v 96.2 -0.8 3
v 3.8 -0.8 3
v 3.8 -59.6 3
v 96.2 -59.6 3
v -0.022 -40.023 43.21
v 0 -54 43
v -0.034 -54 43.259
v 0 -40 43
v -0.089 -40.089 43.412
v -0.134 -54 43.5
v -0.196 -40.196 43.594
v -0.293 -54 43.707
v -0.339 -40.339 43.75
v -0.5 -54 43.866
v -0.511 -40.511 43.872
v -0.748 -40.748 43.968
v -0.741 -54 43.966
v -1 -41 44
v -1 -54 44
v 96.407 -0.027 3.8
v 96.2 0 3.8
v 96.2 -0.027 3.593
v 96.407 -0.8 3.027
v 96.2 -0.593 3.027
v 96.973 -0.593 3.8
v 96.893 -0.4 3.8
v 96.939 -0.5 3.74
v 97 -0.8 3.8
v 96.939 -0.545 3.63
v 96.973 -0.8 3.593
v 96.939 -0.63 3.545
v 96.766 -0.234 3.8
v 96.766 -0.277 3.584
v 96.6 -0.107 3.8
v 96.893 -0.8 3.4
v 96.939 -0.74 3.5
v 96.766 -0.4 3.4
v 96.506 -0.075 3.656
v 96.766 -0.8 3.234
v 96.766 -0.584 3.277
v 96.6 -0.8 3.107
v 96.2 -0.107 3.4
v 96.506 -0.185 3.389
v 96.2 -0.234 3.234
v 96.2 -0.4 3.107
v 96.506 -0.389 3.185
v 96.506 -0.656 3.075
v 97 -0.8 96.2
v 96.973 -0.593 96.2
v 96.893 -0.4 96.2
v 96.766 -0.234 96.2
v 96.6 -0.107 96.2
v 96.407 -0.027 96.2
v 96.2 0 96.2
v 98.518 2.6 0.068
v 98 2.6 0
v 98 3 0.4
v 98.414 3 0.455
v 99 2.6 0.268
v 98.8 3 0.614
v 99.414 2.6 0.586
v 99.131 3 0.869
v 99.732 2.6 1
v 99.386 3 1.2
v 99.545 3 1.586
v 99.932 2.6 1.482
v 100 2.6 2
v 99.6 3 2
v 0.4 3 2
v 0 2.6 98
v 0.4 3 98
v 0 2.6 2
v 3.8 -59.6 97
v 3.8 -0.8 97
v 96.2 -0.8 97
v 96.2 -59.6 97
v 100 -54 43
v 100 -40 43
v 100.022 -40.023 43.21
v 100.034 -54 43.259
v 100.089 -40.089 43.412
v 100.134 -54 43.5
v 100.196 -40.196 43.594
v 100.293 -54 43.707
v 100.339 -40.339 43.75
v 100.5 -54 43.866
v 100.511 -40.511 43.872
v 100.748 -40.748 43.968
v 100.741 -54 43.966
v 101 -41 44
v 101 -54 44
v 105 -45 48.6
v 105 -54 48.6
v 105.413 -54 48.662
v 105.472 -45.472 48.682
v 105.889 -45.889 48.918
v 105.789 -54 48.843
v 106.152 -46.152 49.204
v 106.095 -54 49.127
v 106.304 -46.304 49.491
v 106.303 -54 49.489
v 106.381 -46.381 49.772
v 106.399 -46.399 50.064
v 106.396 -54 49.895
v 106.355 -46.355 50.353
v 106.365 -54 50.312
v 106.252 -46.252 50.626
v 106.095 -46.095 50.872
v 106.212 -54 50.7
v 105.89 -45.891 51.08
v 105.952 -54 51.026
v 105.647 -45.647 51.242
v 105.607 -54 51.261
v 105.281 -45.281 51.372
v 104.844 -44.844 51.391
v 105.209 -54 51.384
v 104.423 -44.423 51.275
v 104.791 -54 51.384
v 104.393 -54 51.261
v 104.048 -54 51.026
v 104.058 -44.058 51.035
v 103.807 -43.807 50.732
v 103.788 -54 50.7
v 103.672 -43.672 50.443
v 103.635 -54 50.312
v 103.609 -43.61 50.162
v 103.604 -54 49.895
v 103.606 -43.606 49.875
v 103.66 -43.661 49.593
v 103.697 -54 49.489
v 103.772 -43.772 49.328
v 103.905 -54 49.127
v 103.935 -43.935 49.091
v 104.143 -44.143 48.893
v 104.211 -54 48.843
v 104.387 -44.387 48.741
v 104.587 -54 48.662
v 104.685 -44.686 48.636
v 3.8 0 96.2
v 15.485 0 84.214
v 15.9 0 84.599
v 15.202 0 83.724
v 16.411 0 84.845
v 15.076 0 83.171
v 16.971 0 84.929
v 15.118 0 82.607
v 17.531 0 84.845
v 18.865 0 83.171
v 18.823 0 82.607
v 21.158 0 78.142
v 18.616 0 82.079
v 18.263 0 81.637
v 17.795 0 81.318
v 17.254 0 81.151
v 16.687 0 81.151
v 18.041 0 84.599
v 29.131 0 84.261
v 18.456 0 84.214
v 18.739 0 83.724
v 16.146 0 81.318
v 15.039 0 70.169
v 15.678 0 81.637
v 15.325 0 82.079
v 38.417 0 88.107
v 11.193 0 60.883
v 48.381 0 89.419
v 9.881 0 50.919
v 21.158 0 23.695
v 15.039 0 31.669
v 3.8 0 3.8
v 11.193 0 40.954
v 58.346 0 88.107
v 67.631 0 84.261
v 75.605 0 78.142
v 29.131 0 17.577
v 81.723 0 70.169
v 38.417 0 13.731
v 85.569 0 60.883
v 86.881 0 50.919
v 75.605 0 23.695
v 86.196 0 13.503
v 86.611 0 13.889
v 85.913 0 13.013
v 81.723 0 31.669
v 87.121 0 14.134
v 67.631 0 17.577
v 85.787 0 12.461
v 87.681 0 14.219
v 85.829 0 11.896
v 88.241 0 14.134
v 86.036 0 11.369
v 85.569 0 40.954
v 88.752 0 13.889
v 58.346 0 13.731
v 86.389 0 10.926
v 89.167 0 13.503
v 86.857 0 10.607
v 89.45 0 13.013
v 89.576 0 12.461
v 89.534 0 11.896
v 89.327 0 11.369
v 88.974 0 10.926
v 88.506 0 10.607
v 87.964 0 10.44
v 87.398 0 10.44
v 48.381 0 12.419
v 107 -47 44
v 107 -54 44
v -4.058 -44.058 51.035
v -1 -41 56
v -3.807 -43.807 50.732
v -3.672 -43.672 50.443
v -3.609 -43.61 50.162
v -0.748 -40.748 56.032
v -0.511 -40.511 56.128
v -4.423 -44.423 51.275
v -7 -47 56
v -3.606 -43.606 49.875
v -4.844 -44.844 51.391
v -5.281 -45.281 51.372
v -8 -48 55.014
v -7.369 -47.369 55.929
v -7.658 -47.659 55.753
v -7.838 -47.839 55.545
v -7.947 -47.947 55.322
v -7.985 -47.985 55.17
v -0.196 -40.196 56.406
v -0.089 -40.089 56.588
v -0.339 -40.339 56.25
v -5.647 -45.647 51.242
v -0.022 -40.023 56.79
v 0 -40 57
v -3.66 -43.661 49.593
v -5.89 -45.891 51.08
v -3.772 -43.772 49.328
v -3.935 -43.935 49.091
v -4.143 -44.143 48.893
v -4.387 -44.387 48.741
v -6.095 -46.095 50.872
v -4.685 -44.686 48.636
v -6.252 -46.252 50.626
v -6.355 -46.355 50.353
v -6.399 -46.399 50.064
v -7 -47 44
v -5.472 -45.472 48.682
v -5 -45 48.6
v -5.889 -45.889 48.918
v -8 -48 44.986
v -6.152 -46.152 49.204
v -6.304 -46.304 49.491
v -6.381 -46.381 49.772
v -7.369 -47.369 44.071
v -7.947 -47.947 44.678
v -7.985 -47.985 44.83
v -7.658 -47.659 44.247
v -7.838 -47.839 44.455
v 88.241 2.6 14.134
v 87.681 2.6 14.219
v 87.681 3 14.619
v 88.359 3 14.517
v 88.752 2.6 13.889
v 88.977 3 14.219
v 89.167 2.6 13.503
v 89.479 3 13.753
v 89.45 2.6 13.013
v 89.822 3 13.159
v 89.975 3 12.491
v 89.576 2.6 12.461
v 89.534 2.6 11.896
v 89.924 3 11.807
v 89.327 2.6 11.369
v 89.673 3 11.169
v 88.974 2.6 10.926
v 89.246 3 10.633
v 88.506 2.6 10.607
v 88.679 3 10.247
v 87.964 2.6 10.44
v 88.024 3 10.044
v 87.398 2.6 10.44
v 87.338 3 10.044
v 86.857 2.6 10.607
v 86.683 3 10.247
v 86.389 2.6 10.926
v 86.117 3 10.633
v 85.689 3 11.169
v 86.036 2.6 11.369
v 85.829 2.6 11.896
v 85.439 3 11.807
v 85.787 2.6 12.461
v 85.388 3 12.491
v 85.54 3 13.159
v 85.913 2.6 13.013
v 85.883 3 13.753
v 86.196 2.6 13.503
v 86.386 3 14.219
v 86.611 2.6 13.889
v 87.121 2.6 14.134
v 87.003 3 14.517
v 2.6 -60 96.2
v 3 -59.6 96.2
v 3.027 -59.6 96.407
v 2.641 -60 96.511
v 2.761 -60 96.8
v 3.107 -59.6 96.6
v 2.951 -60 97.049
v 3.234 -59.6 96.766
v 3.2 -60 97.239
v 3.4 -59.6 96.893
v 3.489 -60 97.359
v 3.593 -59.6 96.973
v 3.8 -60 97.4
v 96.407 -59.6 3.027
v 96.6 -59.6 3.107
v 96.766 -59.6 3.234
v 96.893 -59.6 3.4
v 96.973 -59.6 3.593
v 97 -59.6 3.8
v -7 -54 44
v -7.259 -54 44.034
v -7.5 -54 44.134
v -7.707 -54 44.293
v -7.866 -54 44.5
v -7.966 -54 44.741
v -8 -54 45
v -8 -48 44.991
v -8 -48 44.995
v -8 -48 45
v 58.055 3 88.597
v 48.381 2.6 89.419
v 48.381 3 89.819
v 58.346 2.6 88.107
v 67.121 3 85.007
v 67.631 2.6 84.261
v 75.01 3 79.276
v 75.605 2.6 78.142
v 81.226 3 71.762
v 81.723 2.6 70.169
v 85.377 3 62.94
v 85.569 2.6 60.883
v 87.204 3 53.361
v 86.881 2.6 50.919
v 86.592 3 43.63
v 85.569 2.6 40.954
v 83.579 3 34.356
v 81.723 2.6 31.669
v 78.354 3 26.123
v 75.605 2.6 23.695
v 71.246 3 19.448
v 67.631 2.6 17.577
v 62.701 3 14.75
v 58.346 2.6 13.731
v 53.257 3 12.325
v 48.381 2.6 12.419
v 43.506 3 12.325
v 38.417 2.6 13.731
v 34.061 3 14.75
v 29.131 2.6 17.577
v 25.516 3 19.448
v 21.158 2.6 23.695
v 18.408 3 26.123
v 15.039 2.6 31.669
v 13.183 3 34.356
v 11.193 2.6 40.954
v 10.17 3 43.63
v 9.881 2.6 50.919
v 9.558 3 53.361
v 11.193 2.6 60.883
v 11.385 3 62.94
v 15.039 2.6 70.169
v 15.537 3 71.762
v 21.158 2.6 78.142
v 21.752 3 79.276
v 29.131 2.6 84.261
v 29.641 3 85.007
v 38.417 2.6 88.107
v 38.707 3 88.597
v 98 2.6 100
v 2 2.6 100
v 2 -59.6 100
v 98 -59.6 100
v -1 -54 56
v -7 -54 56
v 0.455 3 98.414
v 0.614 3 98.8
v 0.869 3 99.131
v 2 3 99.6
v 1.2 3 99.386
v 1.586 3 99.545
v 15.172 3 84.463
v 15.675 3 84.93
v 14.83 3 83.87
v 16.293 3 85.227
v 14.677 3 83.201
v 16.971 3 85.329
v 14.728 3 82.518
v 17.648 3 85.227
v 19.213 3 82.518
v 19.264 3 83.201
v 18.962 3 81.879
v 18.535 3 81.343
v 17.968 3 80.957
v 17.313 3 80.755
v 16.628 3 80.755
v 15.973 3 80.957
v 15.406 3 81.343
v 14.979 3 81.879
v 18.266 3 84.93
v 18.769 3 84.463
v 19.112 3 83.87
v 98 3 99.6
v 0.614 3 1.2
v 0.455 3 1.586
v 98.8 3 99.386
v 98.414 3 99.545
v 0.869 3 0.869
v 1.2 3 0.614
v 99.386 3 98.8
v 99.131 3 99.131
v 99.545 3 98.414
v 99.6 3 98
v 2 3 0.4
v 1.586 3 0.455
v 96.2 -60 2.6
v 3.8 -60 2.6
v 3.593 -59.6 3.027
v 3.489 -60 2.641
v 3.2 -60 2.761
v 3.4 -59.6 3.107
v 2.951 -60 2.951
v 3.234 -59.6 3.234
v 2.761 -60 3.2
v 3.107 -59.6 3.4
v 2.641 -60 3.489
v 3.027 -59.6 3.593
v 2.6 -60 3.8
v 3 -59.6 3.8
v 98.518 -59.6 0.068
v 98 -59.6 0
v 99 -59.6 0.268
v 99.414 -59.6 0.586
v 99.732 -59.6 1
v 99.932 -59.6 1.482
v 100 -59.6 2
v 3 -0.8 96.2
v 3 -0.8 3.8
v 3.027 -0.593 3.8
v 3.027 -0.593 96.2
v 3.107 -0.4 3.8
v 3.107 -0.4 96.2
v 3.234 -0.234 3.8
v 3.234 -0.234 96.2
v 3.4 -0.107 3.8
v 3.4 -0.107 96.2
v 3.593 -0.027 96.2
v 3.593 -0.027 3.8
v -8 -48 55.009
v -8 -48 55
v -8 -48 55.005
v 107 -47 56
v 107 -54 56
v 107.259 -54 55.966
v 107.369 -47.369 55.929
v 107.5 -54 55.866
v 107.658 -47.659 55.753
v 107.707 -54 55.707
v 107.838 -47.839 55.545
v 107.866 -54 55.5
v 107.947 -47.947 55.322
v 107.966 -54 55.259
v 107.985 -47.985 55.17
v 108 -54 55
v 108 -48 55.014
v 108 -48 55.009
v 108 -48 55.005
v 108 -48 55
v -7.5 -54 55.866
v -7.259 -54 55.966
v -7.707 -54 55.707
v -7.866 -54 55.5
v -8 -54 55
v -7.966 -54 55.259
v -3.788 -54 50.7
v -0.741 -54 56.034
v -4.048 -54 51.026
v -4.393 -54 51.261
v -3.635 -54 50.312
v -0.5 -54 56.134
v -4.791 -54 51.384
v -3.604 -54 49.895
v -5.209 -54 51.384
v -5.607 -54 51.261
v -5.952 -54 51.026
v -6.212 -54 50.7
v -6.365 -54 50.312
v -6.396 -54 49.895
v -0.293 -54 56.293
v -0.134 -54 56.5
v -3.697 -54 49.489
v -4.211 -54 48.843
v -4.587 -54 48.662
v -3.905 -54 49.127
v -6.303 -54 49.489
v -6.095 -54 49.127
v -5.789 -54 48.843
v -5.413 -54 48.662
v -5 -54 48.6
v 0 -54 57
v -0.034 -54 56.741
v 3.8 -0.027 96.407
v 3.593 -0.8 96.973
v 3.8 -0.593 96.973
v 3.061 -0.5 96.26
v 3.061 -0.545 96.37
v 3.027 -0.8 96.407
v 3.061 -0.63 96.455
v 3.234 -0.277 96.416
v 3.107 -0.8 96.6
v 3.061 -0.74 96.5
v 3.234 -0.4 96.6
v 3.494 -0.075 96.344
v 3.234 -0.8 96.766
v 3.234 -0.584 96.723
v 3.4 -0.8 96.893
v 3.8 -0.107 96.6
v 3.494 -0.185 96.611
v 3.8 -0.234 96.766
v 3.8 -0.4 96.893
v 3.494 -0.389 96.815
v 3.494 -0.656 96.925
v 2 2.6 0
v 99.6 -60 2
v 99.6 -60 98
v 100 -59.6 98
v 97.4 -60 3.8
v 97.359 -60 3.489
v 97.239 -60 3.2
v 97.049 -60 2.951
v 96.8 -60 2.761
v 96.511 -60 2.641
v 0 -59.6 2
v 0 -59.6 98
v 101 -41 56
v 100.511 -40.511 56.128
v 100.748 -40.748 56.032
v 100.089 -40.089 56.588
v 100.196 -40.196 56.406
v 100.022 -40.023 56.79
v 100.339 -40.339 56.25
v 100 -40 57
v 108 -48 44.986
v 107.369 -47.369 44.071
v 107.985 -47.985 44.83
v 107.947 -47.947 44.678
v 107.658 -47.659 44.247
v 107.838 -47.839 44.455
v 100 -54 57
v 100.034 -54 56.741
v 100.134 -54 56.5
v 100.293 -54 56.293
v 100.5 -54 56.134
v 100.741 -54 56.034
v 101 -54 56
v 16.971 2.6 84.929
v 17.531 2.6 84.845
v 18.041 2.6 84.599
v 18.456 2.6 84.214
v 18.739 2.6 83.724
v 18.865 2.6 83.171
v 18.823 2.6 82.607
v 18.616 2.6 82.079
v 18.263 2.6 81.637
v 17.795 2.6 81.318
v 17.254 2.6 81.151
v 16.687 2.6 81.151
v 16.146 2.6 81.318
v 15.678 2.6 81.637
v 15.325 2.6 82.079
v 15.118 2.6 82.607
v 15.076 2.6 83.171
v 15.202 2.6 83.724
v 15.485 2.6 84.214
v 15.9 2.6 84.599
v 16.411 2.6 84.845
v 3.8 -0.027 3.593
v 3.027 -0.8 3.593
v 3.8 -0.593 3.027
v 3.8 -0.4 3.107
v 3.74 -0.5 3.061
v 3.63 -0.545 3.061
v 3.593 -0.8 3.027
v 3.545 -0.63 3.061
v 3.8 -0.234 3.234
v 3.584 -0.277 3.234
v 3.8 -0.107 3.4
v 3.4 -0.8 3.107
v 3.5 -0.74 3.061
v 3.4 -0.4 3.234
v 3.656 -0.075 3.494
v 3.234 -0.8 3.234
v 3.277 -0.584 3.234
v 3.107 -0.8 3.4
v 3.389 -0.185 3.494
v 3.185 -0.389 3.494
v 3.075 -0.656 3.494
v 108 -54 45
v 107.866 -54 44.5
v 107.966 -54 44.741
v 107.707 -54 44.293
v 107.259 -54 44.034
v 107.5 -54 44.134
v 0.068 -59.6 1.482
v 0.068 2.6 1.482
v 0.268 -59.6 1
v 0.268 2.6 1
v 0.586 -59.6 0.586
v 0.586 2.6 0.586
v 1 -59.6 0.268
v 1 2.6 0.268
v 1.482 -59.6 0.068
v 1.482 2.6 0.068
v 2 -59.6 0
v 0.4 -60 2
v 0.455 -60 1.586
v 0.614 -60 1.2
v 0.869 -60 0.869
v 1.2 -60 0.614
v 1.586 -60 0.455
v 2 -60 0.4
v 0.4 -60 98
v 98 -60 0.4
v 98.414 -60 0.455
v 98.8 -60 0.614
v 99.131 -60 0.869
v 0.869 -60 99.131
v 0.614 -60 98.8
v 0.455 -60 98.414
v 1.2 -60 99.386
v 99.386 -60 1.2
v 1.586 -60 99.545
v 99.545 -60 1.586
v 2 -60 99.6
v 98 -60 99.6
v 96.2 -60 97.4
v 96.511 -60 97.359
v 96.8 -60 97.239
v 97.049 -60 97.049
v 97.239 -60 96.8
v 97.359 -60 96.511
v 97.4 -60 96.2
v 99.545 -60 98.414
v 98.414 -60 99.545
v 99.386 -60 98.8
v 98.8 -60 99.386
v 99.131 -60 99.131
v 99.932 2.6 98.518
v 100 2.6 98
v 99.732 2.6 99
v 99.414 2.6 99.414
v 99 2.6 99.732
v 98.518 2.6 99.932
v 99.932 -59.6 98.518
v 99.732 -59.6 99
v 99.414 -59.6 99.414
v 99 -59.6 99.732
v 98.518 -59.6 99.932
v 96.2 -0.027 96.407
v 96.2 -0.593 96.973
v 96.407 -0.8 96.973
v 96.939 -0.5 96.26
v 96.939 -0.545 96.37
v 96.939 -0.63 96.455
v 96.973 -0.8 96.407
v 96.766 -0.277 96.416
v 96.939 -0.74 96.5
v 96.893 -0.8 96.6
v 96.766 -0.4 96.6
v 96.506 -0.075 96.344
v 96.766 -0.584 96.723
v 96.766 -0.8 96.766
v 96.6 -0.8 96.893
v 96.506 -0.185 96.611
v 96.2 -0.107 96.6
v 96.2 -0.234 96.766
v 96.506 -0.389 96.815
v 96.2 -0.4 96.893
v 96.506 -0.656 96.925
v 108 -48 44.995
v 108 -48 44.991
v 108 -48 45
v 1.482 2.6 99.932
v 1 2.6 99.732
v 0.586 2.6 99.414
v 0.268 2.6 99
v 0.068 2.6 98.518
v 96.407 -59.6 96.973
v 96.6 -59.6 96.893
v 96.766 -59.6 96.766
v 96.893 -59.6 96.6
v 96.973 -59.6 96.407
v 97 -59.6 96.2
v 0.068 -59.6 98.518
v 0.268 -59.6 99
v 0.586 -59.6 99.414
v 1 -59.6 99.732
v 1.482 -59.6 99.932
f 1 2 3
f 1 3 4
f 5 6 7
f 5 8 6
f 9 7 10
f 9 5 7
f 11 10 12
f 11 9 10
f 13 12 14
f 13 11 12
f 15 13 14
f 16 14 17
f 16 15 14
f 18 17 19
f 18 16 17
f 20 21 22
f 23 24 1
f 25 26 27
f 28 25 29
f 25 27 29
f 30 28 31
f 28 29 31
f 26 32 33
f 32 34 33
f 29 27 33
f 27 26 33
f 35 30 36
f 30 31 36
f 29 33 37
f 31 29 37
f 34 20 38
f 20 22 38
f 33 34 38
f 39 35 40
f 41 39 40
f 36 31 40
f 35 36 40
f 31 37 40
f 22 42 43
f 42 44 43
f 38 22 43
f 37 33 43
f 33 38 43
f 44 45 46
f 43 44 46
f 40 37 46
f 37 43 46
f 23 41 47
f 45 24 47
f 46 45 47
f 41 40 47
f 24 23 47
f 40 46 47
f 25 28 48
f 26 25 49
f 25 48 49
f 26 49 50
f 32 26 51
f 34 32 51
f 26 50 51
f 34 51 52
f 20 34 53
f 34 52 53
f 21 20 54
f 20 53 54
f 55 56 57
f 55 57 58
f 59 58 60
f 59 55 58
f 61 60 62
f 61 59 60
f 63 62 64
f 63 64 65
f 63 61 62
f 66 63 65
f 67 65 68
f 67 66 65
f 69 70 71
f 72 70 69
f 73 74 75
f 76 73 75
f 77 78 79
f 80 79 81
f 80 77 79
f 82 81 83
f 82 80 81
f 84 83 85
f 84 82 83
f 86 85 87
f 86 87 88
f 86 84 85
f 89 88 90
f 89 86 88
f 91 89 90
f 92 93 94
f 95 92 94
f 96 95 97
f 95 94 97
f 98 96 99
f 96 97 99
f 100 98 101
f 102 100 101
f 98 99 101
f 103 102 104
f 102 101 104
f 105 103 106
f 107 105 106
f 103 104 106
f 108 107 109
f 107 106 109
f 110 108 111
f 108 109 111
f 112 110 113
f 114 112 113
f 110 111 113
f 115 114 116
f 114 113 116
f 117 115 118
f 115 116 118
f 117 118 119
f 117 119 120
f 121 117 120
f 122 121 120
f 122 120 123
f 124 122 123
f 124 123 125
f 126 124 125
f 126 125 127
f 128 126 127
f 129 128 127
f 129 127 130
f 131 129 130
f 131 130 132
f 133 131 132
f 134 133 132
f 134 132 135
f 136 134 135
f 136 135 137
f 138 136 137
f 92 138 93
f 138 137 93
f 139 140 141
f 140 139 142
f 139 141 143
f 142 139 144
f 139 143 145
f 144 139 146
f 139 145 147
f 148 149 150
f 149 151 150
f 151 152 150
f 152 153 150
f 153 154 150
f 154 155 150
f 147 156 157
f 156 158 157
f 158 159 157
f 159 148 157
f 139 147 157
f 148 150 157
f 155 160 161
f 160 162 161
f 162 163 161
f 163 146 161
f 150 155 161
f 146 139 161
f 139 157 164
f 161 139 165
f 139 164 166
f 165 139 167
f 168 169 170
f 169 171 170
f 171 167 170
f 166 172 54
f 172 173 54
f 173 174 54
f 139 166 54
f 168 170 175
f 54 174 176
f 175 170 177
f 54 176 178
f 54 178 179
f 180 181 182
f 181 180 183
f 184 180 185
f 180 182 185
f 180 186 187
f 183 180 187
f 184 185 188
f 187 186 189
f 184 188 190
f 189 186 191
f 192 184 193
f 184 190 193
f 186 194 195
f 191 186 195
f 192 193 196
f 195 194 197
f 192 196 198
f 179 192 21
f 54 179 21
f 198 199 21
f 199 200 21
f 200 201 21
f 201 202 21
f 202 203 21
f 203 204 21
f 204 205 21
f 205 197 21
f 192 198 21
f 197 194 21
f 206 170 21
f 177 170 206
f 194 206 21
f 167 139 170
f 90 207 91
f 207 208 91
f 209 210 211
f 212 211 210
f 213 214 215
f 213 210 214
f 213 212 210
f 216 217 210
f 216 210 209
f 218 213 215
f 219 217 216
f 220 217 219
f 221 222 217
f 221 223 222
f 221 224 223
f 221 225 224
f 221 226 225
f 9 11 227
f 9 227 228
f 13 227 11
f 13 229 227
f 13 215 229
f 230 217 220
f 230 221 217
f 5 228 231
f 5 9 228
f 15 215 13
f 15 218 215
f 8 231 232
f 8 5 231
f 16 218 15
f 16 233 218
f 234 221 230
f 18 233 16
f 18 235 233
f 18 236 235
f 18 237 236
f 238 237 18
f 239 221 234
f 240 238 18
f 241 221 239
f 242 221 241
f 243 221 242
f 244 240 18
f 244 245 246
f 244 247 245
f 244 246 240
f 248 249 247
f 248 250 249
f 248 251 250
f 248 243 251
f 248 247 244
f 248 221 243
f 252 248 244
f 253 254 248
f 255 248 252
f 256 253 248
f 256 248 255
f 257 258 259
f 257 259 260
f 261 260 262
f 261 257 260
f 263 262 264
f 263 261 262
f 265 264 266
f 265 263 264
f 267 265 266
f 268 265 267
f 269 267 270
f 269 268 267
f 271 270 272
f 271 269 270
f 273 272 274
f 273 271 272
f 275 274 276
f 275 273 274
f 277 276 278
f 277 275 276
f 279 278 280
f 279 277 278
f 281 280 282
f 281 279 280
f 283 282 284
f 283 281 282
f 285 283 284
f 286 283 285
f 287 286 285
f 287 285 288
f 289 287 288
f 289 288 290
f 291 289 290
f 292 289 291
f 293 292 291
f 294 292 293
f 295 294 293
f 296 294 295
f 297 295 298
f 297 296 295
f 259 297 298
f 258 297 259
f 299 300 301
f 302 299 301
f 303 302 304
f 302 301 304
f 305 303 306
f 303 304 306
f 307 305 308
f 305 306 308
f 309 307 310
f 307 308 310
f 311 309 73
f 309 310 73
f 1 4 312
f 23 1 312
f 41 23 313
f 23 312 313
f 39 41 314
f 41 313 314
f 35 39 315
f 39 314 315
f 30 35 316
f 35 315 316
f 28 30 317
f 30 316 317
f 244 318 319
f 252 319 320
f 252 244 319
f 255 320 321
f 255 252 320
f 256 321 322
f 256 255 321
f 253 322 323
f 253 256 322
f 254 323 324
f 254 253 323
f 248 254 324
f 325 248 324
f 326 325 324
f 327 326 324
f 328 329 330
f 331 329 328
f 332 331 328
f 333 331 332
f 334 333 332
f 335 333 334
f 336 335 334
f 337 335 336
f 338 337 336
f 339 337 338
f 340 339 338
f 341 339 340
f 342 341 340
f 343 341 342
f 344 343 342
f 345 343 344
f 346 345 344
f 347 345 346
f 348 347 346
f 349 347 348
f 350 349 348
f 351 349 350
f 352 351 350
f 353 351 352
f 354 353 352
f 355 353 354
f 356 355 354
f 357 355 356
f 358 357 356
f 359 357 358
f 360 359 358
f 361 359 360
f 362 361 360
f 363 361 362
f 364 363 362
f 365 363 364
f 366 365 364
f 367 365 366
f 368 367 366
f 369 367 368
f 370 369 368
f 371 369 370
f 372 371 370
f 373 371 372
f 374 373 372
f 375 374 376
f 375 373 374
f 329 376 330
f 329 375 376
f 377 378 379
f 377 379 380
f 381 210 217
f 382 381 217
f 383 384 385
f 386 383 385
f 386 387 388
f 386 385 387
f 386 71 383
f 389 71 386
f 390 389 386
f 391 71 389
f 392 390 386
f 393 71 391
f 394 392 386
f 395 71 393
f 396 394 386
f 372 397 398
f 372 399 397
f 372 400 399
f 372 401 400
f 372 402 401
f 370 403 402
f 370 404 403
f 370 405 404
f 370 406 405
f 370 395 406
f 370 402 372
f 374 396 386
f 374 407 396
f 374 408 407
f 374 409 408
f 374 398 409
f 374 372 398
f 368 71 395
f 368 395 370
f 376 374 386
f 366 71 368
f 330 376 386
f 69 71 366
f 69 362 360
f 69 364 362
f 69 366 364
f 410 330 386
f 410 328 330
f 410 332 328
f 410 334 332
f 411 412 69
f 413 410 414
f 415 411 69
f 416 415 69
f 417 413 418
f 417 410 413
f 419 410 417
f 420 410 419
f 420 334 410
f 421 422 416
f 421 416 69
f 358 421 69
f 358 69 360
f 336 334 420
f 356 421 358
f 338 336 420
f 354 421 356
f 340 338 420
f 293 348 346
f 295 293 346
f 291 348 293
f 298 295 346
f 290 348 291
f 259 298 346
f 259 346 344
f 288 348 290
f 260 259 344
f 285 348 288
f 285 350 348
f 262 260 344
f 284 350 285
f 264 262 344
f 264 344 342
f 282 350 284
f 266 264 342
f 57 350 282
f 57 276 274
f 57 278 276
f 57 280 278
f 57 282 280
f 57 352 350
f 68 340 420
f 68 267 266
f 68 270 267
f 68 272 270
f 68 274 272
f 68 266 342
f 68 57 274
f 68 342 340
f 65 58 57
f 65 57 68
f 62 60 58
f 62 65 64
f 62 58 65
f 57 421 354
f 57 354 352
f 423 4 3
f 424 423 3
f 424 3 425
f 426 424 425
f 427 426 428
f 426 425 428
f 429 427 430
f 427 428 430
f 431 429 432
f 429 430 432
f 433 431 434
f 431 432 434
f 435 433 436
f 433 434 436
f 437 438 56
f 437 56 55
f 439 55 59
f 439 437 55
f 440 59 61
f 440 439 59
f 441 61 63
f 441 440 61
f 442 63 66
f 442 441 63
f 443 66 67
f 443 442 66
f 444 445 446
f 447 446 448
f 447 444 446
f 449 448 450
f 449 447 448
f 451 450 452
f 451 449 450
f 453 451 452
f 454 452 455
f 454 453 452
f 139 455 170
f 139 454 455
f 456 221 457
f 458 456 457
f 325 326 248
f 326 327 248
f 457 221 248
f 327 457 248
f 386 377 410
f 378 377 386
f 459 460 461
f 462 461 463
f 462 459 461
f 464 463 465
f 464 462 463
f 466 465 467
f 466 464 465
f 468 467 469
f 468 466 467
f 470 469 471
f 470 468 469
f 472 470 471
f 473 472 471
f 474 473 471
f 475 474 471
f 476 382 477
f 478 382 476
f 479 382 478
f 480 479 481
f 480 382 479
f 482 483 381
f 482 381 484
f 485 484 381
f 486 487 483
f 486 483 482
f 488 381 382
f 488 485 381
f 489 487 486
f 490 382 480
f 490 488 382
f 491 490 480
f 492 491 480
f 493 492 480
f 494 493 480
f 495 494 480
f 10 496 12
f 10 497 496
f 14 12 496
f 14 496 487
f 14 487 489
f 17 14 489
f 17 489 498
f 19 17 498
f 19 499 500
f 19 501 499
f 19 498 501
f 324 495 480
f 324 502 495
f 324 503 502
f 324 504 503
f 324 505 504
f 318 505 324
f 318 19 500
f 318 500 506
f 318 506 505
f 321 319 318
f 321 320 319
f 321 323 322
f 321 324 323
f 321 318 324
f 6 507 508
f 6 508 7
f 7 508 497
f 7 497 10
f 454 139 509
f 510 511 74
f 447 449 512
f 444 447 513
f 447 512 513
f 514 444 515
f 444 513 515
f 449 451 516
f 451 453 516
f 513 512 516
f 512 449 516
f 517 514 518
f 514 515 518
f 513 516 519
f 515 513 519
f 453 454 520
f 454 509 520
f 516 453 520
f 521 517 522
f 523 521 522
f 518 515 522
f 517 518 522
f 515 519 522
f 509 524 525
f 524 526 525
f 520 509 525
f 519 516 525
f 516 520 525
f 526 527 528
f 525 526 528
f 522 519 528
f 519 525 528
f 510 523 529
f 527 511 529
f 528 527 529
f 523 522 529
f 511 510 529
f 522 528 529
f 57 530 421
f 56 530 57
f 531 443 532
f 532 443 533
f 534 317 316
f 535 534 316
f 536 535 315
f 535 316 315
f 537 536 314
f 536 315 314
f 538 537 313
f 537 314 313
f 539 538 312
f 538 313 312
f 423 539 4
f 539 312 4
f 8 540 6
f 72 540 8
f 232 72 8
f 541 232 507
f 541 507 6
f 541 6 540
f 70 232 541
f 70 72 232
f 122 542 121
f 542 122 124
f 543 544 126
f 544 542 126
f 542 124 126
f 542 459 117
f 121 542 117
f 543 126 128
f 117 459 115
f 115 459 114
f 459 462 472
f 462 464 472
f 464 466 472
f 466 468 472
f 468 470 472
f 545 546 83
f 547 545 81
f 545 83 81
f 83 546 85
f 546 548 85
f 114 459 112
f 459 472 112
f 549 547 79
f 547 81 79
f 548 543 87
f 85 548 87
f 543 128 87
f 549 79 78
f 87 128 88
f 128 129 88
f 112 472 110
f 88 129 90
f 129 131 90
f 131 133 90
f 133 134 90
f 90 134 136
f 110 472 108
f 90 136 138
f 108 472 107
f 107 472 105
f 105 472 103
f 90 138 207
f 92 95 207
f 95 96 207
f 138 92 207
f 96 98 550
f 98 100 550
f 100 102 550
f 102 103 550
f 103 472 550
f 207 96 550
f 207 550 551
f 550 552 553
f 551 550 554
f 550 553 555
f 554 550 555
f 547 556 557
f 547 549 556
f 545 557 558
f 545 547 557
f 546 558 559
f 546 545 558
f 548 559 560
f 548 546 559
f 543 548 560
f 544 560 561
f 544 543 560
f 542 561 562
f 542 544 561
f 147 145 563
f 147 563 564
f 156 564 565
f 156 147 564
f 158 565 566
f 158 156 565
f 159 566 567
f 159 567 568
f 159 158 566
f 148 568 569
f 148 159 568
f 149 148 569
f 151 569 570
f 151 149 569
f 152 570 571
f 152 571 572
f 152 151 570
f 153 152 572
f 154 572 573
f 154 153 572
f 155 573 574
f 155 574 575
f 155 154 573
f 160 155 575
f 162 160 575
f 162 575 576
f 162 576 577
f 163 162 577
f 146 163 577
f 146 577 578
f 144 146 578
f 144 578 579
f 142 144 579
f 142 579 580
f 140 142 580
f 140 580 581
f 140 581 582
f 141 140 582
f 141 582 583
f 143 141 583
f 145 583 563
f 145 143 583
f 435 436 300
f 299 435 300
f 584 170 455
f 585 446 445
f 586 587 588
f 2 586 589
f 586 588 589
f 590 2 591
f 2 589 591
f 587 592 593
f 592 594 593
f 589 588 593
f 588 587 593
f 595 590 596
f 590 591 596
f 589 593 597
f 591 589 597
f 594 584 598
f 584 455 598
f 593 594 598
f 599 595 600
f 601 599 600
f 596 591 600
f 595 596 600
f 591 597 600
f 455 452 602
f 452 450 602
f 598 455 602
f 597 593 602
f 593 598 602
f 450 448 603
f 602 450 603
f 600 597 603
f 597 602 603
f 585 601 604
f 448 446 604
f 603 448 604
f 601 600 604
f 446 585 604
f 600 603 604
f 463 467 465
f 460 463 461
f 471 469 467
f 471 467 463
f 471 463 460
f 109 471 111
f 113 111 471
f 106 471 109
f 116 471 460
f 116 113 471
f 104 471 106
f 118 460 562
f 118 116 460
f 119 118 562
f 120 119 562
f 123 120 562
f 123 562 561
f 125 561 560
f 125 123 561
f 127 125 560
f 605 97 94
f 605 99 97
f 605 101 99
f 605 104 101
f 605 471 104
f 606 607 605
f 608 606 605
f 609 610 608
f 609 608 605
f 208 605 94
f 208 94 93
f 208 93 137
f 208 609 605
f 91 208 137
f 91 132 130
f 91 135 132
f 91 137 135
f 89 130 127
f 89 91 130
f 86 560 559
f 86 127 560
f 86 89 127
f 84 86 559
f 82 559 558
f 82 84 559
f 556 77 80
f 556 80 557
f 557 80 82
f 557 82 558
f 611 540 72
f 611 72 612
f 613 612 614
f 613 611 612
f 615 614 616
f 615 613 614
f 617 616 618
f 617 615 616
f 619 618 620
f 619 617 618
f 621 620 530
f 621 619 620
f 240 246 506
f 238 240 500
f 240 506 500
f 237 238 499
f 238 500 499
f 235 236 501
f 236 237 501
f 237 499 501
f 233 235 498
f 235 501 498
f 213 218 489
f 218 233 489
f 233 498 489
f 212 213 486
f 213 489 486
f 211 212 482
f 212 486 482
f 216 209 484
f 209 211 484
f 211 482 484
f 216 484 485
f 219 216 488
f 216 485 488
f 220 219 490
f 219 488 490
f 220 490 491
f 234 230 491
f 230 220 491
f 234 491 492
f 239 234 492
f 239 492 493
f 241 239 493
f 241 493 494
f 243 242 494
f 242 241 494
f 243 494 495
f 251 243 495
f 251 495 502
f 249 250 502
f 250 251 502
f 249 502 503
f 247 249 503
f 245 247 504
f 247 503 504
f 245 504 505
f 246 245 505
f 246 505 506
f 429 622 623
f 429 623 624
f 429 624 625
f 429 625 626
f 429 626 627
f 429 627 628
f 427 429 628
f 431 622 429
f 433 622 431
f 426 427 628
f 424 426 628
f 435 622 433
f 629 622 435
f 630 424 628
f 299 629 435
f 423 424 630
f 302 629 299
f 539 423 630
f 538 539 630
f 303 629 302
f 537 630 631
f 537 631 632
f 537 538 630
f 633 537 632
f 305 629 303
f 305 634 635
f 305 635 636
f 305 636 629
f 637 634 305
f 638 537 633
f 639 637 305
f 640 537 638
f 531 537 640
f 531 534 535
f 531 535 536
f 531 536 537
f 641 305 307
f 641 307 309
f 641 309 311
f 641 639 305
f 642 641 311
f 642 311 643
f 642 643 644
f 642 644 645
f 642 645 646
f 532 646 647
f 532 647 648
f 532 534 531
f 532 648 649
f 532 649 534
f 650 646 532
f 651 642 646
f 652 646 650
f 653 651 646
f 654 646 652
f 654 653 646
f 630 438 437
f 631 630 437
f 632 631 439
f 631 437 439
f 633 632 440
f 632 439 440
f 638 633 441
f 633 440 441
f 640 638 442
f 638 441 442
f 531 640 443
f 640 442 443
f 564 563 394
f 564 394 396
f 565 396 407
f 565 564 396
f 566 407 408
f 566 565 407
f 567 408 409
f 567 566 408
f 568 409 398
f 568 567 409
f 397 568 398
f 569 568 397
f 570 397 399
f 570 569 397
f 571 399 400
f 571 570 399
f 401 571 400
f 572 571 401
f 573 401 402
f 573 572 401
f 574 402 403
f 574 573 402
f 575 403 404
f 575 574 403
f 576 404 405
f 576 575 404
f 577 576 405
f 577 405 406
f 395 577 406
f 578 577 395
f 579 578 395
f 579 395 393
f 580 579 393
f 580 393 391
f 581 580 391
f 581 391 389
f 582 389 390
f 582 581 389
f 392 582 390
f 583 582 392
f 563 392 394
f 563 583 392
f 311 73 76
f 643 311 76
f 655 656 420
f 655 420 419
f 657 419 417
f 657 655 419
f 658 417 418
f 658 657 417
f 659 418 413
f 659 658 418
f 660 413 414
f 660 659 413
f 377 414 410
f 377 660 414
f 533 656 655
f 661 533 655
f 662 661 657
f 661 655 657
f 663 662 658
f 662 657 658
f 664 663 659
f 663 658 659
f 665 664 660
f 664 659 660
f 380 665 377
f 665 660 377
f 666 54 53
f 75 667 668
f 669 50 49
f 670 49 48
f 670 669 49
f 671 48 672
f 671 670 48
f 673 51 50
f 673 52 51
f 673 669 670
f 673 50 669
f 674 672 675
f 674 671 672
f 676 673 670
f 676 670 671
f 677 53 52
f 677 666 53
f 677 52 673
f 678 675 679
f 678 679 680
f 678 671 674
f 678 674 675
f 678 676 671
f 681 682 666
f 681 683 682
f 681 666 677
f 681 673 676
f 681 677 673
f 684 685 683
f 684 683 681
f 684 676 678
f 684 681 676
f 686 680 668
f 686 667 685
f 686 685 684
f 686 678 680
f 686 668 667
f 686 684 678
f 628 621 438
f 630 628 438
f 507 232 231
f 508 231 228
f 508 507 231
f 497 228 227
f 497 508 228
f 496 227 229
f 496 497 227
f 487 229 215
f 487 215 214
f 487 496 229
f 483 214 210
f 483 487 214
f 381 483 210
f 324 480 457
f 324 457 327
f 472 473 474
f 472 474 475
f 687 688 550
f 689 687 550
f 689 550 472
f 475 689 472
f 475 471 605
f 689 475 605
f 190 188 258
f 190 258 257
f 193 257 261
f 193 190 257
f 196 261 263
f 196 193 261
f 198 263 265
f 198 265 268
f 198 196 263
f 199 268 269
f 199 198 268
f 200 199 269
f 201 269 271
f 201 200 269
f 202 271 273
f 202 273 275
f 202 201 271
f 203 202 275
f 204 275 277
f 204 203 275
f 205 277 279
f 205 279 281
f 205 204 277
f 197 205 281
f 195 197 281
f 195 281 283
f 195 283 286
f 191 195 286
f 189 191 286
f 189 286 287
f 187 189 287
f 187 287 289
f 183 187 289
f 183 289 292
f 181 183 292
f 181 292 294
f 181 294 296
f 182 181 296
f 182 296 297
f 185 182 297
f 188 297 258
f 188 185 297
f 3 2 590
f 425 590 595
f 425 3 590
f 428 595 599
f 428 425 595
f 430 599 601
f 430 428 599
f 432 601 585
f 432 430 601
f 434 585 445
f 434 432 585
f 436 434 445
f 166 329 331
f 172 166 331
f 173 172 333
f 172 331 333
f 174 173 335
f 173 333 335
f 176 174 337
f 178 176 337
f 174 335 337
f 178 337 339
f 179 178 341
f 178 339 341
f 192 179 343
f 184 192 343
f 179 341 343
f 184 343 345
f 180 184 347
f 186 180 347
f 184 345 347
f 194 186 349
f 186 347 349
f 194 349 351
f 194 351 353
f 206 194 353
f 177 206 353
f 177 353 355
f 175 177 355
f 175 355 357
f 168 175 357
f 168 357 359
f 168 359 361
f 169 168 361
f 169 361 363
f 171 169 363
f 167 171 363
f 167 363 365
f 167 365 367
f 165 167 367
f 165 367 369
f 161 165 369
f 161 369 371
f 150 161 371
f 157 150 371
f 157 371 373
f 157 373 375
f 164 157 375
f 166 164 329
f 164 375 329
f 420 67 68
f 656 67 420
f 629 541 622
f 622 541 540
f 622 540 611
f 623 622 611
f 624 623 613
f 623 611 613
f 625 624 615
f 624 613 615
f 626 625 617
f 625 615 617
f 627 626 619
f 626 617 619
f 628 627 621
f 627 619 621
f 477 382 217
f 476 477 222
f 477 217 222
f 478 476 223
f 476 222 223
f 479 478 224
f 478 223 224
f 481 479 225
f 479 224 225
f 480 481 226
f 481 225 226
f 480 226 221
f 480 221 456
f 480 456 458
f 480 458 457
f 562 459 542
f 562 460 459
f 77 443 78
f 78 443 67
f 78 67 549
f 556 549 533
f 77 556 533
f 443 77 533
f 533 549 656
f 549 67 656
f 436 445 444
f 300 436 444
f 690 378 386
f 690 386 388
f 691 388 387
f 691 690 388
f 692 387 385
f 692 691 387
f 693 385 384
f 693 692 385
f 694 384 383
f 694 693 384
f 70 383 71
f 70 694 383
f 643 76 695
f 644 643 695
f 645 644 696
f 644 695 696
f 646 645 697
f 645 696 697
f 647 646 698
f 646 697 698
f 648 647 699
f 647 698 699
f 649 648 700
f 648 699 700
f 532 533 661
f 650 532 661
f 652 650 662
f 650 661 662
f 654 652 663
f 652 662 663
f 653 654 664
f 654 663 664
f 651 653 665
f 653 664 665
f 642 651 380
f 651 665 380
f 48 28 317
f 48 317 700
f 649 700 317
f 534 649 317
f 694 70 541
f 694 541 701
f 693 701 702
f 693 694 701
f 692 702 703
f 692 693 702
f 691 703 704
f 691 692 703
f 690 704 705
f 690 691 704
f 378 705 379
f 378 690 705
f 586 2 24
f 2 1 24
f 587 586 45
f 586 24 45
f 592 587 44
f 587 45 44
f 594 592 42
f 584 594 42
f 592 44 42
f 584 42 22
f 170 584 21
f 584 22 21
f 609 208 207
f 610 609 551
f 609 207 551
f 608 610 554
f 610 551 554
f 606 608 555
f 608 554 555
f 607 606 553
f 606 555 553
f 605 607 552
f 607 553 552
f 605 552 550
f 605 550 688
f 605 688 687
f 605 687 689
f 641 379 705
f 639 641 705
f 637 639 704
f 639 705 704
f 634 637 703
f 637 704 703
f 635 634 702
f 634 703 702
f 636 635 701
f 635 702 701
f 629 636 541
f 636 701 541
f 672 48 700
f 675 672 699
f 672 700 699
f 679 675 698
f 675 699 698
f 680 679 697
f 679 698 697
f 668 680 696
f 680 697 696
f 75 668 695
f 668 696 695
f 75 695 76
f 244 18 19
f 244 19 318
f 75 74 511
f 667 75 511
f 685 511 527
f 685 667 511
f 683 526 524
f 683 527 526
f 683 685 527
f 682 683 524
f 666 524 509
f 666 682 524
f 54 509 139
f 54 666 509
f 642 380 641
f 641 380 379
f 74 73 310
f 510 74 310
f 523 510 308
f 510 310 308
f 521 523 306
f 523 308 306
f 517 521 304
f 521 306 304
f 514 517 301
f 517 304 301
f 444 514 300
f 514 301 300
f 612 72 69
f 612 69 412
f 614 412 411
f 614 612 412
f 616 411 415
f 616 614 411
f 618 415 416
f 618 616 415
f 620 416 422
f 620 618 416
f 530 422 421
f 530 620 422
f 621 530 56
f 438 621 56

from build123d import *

# Parameters (mm, degrees)
SKETCH_1_W          = 100
SKETCH_1_H          = 100
SKETCH_1_R          = 1.9
EXTRUDE_1_DEPTH     = 3
SKETCH_2_R          = 38.5
CUT_EXTRUDE_1_DEPTH = 10
SKETCH_3_W          = 100
SKETCH_3_H          = 100
SKETCH_3_W_2        = 94
SKETCH_3_H_2        = 94
EXTRUDE_2_DEPTH     = 60
FILLET_1_R          = 2
CHAMFER_1_SIZE      = 0.4
FILLET_2_R          = 0.8
CHAMFER_2_SIZE      = 0.4
SKETCH_4_W          = 8
SKETCH_4_H          = 12
EXTRUDE_3_DEPTH     = 6
CHAMFER_3_SIZE      = 8
SKETCH_5_R          = 1.4
CUT_EXTRUDE_2_DEPTH = 158.838525082
FILLET_3_R          = 1


with BuildPart() as part:
    # 草图1 → 凸台-拉伸1 (new body)
    with BuildSketch(Plane(origin=(0, 0, 0), x_dir=(1, 0, 0), z_dir=(0, 1, 0))):
        with Locations((50, -50)):
            Rectangle(SKETCH_1_W, SKETCH_1_H)
        with Locations(Location((16.970562748, -83.029437252, 0), (0, 0, 270))):
            Circle(SKETCH_1_R, mode=Mode.SUBTRACT)
        with Locations(Location((87.681240867, -12.318759133, 0), (0, 0, 270))):
            Circle(SKETCH_1_R, mode=Mode.SUBTRACT)
    extrude(amount=EXTRUDE_1_DEPTH)

    # 草图2 → 切除-拉伸1 (cut)
    with BuildSketch(Plane(origin=(0, 3, 0), x_dir=(1, 0, 0), z_dir=(0, 1, 0))):
        with Locations(Location((48.381240867, -50.918759133, 0), (0, 0, 270))):
            Circle(SKETCH_2_R)
    extrude(amount=-CUT_EXTRUDE_1_DEPTH, mode=Mode.SUBTRACT)

    # 草图3 → 凸台-拉伸2 (add)
    with BuildSketch(Plane.XZ):
        with Locations((50, 50)):
            Rectangle(SKETCH_3_W, SKETCH_3_H)
        with Locations((50, 50)):
            Rectangle(SKETCH_3_W_2, SKETCH_3_H_2, mode=Mode.SUBTRACT)
    extrude(amount=EXTRUDE_2_DEPTH)

    # 圆角1
    fillet_1_edges = [part.edges().sort_by_distance(p)[0] for p in [
        (0, -28.5, 0),
        (100, -28.5, 0),
        (100, -28.5, 100),
        (0, -28.5, 100),
    ]]
    fillet(fillet_1_edges, radius=FILLET_1_R)

    # 倒角1
    chamfer_1_edges = [part.edges().sort_by_distance(p)[0] for p in [
        (16.970562748, 3, 81.129437252),
        (87.681240867, 3, 10.418759133),
        (48.381240867, 3, 12.418759133),
        (50, 3, 0),
        (100, 3, 50),
        (0, 3, 50),
        (50, 3, 100),
        (0.585786438, 3, 99.414213562),
        (0.585786438, 3, 0.585786438),
        (99.414213562, 3, 99.414213562),
        (99.414213562, 3, 0.585786438),
    ]]
    chamfer(chamfer_1_edges, length=CHAMFER_1_SIZE)

    # 圆角2
    fillet_2_edges = [part.edges().sort_by_distance(p)[0] for p in [
        (50, 0, 97),
        (3, 0, 50),
        (50, 0, 3),
        (97, 0, 50),
        (3, -30, 97),
        (3, -30, 3),
        (97, -30, 3),
        (97, -30, 97),
    ]]
    fillet(fillet_2_edges, radius=FILLET_2_R)

    # 倒角2
    chamfer_2_edges = [part.edges().sort_by_distance(p)[0] for p in [
        (50, -60, 97),
        (97, -60, 50),
        (50, -60, 3),
        (3, -60, 50),
        (3.234314575, -60, 3.234314575),
        (96.765685425, -60, 3.234314575),
        (96.765685425, -60, 96.765685425),
        (3.234314575, -60, 96.765685425),
        (50, -60, 0),
        (50, -60, 100),
        (0, -60, 50),
        (100, -60, 50),
        (0.585786438, -60, 99.414213562),
        (0.585786438, -60, 0.585786438),
        (99.414213562, -60, 99.414213562),
        (99.414213562, -60, 0.585786438),
    ]]
    chamfer(chamfer_2_edges, length=CHAMFER_2_SIZE)

    # 草图4 → 凸台-拉伸3 (add)
    with BuildSketch(Plane(origin=(0, -54, 0), x_dir=(-1, 0, 0), z_dir=(0, -1, 0))):
        with Locations((-104, -50)):
            Rectangle(SKETCH_4_W, SKETCH_4_H)
        with Locations((4, -50)):
            Rectangle(SKETCH_4_W, SKETCH_4_H)
    extrude(amount=-EXTRUDE_3_DEPTH)

    # 倒角3
    chamfer_3_edges = [part.edges().sort_by_distance(p)[0] for p in [
        (0, -48, 50),
        (100, -48, 50),
    ]]
    chamfer(chamfer_3_edges, length=CHAMFER_3_SIZE - 0.0001)  # a hair under: the kernel refuses the full size

    # 草图5 → 切除-拉伸2 (cut, through all)
    with BuildSketch(Plane(origin=(0, -54, 0), x_dir=(-1, 0, 0), z_dir=(0, -1, 0))):
        with Locations(Location((5, -50, 0), (0, 0, 90))):
            Circle(SKETCH_5_R)
        with Locations(Location((-105, -50, 0), (0, 0, 90))):
            Circle(SKETCH_5_R)
    extrude(amount=-CUT_EXTRUDE_2_DEPTH, mode=Mode.SUBTRACT)

    # 圆角3
    fillet_3_edges = [part.edges().sort_by_distance(p)[0] for p in [
        (100, -47.00005, 44),
        (100, -47.00005, 56),
        (108, -51, 56),
        (108, -51, 44),
        (0, -47.00005, 56),
        (0, -47.00005, 44),
        (-8, -51, 44),
        (-8, -51, 56),
    ]]
    fillet(fillet_3_edges, radius=FILLET_3_R)


solid = part.part
